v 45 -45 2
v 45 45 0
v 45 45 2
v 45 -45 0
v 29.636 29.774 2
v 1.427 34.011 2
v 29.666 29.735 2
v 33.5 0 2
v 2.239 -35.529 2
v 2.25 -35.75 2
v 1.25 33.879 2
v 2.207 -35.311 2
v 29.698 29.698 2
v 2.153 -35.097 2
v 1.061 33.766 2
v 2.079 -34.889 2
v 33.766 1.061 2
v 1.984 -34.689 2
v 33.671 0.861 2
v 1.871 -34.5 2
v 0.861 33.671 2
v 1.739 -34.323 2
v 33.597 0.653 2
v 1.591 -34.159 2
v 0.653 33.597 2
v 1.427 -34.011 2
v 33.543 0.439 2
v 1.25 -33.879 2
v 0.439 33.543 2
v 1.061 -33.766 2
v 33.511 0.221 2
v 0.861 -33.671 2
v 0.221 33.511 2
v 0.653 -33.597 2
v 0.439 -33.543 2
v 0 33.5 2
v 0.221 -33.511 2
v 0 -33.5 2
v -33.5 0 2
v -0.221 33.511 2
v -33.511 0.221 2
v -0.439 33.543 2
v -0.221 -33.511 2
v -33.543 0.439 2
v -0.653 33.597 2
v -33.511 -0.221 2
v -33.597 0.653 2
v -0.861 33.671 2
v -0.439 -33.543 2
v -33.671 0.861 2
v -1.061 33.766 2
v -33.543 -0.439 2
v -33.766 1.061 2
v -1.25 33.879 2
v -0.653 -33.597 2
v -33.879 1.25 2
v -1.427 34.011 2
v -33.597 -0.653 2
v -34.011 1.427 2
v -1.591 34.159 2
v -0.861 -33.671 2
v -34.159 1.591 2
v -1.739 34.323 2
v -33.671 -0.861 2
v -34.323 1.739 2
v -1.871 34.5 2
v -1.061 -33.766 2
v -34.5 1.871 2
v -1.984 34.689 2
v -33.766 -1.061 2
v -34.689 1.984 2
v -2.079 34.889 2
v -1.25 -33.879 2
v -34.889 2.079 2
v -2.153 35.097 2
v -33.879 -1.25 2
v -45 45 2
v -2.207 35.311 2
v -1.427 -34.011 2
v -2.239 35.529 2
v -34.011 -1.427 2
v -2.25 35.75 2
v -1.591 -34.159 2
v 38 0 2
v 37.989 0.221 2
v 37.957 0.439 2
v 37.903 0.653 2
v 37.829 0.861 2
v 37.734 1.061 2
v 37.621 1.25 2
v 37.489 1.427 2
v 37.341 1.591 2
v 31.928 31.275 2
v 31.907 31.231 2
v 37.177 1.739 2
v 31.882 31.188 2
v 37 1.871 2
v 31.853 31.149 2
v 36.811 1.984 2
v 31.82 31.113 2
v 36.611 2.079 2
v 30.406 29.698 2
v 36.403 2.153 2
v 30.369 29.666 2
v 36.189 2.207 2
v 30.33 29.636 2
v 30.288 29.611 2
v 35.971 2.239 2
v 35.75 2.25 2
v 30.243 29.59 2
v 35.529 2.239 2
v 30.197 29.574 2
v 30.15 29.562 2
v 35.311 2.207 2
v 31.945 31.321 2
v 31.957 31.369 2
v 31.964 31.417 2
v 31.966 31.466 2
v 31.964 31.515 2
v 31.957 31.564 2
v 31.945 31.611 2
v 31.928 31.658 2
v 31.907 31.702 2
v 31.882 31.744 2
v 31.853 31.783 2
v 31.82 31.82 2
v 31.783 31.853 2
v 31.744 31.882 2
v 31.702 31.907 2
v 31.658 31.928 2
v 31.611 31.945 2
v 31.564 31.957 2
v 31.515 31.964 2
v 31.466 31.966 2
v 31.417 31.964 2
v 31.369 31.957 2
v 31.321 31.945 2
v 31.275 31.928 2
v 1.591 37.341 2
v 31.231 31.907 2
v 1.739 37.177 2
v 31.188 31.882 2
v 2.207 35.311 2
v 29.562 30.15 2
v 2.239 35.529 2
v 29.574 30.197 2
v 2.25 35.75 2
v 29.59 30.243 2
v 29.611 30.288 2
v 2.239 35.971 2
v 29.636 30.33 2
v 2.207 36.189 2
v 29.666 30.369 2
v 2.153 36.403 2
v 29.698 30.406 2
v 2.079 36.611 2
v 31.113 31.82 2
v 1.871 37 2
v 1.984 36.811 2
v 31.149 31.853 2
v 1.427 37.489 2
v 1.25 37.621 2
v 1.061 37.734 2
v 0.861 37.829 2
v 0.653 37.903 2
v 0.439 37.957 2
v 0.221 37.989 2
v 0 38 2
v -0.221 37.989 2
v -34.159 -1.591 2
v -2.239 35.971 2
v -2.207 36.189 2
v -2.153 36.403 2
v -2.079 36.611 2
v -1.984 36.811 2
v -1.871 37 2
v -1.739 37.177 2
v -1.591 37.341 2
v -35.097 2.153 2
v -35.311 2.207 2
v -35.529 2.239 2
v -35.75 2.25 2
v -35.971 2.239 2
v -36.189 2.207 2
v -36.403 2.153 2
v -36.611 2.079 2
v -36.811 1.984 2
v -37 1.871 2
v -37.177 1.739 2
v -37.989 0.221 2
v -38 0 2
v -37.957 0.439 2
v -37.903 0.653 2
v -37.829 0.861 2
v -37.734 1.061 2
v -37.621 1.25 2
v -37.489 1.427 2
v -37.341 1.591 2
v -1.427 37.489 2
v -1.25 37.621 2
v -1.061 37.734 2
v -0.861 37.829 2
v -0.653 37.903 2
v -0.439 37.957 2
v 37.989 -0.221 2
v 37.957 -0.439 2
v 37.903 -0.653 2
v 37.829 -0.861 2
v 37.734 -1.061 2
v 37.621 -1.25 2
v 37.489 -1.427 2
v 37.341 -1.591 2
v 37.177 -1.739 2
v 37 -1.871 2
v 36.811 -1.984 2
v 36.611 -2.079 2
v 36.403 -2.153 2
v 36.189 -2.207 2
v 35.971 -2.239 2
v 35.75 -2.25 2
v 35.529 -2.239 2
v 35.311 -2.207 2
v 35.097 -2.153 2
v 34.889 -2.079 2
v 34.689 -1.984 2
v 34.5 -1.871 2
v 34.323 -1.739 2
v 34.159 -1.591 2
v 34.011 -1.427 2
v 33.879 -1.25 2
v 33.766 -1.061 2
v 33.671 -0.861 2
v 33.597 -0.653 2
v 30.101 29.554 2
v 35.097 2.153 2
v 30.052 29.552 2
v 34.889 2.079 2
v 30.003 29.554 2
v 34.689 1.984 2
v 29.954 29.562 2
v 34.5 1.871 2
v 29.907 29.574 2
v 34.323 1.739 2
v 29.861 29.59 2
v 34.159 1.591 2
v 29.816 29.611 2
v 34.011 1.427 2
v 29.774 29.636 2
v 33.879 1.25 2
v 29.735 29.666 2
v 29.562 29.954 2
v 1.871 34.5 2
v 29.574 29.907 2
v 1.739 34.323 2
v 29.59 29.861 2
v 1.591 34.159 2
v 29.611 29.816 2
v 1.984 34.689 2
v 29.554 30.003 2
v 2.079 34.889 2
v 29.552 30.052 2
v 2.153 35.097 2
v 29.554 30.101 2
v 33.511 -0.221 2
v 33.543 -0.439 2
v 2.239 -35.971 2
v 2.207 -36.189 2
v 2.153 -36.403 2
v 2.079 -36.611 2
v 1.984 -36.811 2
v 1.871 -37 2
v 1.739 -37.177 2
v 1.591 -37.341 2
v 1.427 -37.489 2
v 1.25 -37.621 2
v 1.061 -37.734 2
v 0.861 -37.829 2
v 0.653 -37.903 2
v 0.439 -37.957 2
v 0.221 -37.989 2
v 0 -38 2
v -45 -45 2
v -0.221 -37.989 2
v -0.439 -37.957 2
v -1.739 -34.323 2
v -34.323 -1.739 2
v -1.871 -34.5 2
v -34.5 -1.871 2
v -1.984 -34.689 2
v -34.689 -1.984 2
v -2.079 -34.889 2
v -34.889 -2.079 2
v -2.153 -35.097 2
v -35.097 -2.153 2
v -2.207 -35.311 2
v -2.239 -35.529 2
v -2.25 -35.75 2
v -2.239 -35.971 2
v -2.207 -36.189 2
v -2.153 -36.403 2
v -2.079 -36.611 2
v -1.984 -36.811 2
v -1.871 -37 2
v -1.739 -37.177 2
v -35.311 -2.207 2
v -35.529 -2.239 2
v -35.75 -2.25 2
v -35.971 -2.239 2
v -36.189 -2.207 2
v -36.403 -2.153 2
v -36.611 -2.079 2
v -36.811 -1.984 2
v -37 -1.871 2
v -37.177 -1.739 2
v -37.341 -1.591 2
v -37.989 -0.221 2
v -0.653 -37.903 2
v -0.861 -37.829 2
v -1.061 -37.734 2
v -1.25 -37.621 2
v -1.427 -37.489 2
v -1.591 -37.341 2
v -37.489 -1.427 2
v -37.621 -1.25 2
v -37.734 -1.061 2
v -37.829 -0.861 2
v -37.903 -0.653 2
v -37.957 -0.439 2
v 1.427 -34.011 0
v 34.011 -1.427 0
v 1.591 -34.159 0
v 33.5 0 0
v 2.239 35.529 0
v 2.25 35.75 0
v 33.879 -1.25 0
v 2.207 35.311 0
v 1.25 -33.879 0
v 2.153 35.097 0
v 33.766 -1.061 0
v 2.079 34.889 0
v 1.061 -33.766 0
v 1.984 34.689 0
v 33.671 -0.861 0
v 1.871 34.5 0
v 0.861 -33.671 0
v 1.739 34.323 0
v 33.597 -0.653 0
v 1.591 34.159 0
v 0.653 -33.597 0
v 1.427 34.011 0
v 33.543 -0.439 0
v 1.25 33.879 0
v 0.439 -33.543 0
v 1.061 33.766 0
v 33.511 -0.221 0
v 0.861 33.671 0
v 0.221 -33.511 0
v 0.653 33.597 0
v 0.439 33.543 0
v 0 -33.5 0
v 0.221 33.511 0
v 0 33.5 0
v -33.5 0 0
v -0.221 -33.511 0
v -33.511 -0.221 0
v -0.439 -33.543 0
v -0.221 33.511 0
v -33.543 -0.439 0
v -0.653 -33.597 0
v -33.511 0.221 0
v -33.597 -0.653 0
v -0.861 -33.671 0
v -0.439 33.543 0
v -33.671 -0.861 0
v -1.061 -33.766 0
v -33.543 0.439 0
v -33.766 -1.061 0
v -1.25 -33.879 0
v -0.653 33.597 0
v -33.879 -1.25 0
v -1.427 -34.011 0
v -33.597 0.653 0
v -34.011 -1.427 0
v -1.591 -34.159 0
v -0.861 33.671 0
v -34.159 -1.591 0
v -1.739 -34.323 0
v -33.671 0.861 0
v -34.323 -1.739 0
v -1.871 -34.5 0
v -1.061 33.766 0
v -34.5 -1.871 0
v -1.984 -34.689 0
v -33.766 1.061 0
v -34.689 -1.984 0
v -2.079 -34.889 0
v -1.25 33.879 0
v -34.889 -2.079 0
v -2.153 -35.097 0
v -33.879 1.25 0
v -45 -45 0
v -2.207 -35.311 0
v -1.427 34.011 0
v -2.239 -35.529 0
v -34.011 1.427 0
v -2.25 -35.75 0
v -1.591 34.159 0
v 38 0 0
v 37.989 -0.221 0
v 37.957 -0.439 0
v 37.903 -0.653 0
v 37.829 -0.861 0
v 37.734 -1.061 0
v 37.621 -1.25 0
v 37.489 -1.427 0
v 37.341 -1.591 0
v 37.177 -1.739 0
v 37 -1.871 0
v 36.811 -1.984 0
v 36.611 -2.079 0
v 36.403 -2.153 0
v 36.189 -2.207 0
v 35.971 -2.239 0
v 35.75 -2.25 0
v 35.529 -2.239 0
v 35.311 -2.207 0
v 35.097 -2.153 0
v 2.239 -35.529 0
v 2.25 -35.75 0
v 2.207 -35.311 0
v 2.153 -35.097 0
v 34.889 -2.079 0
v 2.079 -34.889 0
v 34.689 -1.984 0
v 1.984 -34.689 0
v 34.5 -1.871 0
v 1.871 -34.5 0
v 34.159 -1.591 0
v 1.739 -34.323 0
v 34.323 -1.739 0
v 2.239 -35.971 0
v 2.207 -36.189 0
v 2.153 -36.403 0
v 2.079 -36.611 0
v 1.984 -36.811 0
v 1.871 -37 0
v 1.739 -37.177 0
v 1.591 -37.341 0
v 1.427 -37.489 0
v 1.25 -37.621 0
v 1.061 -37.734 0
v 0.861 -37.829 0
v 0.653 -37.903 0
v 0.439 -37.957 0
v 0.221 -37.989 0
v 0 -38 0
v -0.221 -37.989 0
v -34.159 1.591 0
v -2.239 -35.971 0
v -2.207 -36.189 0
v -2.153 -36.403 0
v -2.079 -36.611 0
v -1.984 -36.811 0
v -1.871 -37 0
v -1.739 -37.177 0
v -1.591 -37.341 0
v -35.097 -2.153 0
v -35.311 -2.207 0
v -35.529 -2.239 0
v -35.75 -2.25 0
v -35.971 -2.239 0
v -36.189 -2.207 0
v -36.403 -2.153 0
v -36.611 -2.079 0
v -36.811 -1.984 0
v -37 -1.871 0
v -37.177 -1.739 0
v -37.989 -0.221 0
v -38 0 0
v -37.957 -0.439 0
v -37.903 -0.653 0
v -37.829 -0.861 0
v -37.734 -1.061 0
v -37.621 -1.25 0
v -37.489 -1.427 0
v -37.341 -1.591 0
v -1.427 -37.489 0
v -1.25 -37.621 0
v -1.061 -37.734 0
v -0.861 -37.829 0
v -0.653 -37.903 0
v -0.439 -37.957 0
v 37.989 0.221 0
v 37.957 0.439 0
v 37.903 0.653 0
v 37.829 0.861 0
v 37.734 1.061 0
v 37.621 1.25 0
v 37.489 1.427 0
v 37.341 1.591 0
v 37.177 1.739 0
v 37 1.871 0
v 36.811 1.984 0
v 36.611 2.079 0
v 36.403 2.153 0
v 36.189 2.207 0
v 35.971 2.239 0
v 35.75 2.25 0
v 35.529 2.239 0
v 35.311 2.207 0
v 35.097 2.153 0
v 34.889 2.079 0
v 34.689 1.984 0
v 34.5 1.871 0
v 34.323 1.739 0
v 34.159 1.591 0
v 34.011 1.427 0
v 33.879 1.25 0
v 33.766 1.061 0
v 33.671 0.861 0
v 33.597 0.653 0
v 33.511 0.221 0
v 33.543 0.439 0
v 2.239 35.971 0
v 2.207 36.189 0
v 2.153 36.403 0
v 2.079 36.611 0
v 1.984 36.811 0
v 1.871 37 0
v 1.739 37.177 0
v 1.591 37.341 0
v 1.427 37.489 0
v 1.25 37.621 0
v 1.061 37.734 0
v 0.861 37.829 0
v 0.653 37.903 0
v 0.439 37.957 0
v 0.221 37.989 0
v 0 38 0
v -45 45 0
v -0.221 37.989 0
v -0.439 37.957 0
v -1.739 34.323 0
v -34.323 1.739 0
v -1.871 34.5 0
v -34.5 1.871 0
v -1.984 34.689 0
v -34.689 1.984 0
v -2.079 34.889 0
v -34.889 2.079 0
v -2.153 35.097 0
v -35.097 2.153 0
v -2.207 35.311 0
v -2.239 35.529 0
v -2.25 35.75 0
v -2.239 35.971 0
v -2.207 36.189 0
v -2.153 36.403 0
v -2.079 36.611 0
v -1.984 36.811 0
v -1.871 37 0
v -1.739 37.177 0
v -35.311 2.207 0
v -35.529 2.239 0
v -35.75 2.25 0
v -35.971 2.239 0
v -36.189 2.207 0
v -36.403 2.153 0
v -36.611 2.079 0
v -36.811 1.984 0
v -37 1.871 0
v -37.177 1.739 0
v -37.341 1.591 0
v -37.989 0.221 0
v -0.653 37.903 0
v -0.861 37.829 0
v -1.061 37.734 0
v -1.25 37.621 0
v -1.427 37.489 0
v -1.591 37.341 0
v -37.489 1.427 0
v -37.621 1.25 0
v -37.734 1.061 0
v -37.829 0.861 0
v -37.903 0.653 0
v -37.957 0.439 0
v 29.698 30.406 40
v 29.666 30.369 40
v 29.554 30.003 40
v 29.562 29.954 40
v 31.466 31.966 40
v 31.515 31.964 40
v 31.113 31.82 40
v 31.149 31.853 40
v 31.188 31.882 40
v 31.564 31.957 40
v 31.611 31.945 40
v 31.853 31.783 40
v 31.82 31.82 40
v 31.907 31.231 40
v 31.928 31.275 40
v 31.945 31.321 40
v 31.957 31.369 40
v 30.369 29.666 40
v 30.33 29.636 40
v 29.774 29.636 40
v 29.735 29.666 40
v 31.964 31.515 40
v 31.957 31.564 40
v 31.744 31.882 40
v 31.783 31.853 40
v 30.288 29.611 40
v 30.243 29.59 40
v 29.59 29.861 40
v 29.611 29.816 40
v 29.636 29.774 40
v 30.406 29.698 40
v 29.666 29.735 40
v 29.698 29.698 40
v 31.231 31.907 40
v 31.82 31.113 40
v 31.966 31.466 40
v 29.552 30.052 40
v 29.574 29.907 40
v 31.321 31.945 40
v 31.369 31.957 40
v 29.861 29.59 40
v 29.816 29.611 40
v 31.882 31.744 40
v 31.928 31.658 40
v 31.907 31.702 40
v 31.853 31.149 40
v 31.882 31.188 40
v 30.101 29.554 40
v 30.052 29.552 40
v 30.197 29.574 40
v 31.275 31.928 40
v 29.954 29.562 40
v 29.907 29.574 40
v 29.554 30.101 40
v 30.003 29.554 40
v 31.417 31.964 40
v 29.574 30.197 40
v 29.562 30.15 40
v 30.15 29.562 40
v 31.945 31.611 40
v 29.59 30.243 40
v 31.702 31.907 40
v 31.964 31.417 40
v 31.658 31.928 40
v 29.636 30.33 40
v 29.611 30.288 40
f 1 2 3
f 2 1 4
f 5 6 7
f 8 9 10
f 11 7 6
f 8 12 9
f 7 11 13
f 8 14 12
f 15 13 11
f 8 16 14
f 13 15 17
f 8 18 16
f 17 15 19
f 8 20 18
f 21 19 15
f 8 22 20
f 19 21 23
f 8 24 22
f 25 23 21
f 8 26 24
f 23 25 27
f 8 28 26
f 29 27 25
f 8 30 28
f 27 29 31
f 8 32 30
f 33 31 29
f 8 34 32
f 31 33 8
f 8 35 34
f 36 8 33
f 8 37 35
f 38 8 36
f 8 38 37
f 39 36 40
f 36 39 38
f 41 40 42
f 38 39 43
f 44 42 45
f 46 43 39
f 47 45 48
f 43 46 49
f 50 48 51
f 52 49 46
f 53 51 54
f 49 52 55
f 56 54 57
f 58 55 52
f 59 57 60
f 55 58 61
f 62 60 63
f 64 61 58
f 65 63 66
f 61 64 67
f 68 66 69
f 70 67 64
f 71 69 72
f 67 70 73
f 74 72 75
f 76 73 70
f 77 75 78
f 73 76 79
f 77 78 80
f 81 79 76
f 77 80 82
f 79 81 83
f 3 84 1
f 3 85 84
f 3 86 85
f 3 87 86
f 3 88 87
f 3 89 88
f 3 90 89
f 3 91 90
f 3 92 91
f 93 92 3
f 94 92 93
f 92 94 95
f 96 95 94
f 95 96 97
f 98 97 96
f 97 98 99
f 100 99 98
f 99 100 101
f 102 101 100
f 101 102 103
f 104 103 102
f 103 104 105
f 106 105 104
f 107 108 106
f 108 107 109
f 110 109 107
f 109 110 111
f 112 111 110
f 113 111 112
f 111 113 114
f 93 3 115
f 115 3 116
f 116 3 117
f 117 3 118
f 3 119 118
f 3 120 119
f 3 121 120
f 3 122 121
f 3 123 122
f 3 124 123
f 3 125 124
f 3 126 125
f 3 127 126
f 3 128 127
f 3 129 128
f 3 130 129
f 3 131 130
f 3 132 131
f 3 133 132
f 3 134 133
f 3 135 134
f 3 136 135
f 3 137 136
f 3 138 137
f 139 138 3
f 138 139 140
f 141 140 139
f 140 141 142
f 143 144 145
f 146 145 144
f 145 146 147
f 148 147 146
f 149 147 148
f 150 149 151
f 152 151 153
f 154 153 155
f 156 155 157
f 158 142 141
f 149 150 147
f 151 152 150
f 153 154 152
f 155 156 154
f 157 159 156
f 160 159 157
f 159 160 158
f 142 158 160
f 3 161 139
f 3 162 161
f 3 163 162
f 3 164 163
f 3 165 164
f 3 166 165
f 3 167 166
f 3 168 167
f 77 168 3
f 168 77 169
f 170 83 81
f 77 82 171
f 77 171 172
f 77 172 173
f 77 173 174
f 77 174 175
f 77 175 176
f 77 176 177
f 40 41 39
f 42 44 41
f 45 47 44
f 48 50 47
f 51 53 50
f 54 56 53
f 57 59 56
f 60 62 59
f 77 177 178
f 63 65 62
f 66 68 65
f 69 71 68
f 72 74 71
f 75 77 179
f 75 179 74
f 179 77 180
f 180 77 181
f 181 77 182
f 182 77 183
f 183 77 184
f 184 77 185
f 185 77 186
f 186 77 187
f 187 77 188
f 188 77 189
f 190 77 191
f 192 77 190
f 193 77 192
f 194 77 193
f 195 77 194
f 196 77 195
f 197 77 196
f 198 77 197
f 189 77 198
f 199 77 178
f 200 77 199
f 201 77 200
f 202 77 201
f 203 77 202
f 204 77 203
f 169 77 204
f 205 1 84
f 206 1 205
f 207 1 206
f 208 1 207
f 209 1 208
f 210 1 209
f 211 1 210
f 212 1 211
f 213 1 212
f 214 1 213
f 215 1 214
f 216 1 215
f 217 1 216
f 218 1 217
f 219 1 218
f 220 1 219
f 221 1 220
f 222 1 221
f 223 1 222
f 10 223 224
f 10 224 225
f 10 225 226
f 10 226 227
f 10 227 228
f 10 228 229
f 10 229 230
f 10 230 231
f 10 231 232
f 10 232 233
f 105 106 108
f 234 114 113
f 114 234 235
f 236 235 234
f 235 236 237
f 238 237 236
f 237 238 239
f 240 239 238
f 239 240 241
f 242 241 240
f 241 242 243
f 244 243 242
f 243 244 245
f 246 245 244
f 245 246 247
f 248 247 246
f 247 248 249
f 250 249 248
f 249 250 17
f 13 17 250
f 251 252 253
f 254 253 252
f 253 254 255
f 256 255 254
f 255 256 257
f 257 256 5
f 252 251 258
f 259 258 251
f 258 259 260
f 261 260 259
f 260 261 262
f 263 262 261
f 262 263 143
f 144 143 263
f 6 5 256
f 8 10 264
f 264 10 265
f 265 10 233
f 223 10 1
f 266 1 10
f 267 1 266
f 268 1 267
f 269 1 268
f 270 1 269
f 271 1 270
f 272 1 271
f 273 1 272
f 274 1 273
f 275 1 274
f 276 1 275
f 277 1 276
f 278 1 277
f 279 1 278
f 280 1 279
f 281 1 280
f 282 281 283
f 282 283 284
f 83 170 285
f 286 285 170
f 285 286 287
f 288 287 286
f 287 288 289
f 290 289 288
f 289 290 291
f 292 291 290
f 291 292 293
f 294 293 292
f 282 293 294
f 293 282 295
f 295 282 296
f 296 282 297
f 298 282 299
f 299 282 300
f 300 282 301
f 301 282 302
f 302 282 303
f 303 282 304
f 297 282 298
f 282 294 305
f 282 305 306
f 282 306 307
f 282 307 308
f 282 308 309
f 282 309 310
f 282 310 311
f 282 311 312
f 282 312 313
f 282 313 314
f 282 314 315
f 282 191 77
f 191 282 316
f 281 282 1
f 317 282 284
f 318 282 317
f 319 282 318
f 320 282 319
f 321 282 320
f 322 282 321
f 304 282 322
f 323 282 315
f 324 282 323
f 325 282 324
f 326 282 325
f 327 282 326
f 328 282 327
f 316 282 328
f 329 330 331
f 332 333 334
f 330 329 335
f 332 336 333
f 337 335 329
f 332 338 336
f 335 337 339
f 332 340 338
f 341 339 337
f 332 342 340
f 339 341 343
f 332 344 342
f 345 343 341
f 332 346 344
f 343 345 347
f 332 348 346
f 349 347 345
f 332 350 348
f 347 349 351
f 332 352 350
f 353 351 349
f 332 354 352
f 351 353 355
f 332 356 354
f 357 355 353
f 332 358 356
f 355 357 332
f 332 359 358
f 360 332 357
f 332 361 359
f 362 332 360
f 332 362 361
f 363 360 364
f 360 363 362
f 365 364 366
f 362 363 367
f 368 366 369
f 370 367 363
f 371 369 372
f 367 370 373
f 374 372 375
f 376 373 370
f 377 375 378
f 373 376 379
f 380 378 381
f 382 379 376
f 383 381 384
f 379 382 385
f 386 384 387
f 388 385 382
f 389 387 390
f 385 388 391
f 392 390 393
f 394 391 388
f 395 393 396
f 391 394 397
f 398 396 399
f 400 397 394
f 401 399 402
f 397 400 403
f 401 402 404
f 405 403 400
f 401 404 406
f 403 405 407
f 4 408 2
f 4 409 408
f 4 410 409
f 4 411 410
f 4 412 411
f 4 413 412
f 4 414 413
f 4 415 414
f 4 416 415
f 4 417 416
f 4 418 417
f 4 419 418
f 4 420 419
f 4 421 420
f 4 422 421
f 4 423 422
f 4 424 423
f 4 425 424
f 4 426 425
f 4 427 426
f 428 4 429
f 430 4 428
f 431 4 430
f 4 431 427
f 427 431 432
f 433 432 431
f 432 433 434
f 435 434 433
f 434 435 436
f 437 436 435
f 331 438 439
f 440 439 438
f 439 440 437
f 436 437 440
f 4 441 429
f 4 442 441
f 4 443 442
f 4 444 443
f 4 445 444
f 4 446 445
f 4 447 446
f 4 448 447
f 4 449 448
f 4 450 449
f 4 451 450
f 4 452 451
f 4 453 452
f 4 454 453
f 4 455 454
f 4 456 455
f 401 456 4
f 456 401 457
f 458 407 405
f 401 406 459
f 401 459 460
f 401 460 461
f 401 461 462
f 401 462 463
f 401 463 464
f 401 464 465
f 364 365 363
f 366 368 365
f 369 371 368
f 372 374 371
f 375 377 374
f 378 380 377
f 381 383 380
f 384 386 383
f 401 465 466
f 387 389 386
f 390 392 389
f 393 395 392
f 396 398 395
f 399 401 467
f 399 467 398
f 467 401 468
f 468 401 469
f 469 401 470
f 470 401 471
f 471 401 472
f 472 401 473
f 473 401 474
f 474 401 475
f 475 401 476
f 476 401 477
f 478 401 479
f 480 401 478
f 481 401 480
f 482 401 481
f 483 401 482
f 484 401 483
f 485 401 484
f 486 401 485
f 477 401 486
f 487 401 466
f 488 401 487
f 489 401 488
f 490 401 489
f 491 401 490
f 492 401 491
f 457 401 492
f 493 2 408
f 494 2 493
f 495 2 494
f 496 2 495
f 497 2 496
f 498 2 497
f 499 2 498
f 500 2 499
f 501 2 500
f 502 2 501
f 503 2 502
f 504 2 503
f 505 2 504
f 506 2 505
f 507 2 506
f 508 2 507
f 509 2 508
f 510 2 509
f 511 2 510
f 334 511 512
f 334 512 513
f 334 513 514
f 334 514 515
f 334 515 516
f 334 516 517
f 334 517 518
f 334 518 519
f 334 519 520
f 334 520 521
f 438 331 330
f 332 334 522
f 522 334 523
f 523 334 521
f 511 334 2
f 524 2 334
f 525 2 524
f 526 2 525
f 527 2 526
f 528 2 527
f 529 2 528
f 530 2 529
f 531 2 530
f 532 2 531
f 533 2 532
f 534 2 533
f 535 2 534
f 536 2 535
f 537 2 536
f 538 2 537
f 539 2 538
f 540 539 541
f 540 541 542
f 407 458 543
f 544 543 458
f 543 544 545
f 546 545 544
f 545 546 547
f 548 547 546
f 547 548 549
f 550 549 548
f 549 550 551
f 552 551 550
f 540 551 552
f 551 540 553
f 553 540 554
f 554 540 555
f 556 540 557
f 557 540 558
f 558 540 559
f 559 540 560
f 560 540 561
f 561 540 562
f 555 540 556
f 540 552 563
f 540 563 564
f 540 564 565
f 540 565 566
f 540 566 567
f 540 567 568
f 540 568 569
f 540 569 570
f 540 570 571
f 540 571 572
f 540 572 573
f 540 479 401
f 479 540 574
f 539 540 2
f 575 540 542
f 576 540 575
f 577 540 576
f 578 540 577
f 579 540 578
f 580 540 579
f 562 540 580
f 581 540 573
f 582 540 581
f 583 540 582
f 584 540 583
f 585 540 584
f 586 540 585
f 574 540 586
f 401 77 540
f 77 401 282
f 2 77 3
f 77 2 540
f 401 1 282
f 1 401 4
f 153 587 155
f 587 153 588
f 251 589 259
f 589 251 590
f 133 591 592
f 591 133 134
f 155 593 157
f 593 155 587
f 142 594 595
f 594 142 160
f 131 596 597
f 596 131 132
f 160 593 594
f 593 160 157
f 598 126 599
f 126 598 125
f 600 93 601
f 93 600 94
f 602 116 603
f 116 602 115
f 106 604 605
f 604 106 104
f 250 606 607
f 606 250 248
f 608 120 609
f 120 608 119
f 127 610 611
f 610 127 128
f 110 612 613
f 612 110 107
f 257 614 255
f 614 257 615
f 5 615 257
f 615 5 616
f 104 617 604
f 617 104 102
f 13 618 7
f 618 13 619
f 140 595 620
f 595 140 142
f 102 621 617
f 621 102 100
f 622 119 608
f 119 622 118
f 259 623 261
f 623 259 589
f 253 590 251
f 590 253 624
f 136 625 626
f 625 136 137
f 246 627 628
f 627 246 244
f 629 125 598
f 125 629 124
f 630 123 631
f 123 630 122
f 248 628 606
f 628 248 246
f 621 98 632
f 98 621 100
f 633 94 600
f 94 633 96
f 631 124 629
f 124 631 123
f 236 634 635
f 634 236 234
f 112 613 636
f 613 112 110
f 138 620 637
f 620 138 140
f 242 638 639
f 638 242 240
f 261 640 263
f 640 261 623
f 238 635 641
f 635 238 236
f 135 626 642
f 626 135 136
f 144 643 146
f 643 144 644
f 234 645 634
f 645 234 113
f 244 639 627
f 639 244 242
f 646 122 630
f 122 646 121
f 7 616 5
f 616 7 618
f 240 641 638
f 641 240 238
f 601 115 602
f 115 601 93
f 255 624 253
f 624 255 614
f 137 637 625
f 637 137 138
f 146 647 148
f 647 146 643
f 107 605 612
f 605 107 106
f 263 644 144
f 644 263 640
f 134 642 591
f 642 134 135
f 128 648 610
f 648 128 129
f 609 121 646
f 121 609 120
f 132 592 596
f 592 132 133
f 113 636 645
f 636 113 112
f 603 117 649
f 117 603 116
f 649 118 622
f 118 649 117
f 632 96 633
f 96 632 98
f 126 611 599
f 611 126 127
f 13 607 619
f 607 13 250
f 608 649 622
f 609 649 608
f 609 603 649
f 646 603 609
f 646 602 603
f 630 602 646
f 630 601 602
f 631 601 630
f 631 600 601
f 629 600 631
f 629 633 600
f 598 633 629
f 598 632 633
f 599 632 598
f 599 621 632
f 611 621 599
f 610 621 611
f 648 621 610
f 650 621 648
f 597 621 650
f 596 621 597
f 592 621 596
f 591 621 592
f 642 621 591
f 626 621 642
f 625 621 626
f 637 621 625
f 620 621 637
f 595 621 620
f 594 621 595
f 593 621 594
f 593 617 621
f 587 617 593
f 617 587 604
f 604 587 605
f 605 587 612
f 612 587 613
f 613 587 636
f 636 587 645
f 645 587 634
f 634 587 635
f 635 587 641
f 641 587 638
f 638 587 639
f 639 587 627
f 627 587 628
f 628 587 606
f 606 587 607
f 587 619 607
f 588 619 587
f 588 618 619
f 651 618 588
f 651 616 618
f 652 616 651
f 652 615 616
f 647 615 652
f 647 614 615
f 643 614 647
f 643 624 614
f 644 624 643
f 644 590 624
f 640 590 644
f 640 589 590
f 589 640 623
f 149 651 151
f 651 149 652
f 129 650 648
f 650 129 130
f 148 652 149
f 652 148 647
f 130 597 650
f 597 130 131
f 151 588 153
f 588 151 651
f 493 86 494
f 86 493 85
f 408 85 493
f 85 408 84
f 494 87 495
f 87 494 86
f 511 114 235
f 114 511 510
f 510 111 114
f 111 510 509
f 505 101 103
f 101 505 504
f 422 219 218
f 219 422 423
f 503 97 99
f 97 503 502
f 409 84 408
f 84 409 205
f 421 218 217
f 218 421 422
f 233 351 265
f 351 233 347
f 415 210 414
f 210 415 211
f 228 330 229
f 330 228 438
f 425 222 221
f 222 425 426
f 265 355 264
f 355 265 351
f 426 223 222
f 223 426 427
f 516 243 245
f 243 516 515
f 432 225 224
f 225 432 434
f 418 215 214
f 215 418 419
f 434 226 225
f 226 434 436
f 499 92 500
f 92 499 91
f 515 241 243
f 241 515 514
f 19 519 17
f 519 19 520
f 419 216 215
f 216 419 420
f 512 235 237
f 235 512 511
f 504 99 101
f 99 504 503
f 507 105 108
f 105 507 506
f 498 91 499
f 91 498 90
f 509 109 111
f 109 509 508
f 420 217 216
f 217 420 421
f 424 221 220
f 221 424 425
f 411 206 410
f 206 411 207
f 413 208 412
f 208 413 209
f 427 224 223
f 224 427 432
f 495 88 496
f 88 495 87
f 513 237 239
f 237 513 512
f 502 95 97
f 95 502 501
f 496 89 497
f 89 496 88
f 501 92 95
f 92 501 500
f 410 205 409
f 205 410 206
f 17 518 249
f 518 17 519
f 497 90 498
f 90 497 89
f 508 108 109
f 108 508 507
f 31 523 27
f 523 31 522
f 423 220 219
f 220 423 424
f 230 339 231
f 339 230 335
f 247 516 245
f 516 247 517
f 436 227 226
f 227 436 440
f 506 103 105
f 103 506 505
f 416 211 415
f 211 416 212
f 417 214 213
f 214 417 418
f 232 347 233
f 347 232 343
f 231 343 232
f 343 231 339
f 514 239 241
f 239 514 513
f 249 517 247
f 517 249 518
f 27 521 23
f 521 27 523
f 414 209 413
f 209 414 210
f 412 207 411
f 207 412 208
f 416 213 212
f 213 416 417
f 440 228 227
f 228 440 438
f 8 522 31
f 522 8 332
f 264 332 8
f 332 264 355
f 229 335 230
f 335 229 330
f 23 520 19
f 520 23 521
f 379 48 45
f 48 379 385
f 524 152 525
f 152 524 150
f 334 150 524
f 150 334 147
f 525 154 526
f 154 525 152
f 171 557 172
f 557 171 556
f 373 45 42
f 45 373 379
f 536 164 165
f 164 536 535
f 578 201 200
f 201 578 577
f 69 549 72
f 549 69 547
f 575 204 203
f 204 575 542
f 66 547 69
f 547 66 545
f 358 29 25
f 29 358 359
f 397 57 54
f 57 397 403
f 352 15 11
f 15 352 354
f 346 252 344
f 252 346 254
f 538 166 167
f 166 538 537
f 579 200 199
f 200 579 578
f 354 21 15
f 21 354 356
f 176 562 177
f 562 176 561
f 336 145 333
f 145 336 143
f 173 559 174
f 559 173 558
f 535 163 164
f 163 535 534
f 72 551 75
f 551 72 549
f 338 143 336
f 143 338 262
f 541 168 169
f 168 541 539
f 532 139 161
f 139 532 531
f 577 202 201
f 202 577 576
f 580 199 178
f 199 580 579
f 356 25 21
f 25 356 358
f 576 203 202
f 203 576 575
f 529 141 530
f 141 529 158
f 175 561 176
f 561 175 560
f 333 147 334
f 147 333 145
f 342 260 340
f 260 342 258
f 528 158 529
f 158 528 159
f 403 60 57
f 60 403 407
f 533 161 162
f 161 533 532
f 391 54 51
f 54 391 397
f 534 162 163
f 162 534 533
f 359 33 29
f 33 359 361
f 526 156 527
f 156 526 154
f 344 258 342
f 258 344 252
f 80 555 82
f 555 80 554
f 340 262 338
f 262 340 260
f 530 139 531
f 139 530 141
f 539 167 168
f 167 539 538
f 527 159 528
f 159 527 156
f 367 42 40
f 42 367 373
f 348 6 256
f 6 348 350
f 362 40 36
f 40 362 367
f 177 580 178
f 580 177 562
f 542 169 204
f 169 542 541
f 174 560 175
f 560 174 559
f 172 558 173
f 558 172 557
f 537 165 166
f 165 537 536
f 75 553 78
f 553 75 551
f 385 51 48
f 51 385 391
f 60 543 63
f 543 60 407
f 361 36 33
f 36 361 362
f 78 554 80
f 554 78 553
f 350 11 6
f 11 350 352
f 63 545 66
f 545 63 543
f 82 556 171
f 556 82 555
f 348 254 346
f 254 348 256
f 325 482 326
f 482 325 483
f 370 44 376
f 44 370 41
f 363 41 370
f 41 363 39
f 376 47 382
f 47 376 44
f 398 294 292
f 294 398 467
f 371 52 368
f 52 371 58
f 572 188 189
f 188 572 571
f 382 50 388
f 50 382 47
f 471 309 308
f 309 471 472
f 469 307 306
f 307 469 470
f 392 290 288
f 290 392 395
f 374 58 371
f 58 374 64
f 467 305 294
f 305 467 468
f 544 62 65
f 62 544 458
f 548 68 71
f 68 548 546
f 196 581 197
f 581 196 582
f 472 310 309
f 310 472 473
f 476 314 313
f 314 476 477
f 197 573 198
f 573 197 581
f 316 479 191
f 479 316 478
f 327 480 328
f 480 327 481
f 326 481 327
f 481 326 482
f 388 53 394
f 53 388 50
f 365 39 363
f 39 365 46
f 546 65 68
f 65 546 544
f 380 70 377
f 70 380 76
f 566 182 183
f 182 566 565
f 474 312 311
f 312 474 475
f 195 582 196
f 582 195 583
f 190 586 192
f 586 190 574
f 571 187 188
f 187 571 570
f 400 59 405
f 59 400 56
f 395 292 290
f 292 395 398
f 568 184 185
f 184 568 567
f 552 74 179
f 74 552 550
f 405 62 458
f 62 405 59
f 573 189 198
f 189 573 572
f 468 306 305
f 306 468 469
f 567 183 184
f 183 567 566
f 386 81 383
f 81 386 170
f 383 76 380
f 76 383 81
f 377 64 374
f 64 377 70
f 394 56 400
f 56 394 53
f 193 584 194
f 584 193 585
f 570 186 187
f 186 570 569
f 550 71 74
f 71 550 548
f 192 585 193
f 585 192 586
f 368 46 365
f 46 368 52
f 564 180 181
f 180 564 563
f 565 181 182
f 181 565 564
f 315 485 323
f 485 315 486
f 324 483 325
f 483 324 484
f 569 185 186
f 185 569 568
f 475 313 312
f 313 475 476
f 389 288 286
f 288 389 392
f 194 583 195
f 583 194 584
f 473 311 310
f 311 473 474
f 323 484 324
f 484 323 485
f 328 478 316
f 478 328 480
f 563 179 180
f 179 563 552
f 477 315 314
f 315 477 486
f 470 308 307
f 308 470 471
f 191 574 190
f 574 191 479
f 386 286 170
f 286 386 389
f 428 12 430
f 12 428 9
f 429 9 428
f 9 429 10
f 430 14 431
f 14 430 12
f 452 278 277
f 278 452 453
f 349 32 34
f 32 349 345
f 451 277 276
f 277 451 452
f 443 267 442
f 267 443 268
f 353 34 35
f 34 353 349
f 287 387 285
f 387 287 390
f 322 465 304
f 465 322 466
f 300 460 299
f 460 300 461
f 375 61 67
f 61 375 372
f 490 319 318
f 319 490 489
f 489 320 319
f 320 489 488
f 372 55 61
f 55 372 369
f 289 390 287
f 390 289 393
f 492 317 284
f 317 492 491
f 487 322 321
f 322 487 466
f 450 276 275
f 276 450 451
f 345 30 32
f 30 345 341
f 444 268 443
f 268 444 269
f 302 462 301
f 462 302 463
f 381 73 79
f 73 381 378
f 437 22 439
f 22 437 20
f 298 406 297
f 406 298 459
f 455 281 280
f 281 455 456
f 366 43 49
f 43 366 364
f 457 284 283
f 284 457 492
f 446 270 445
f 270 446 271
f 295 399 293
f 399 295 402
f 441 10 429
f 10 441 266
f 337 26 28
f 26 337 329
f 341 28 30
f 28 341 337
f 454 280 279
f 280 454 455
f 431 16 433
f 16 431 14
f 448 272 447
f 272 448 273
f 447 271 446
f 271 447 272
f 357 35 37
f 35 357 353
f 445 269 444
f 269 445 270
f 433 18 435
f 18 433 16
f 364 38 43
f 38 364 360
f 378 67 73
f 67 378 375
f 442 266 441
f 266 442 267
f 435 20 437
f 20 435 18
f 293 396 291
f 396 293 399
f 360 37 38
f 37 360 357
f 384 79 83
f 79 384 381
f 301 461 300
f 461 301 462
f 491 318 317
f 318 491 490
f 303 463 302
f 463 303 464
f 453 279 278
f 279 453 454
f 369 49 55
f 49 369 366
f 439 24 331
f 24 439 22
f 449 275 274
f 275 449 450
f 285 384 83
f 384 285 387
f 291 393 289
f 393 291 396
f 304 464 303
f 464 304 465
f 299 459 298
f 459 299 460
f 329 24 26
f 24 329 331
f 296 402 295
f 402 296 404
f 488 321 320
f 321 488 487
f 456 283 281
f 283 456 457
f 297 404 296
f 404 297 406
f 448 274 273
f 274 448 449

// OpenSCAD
// DIY magnetic stirrer housing for 80 mm PC case fan
// Print orientation: top plate down on bed (z = 0), open top at z = 40

// ---------- Parameters ----------
outer_size   = 90;    // outer size of top plate (X x Y), mm
plate_t      = 2;     // top plate thickness, mm
wall_t       = 2.5;   // wall thickness, mm
box_h        = 40;    // overall height, mm
hole_d       = 4.5;   // M4 screw hole diameter, mm
hole_pitch   = 71.5;  // square pattern centre-to-centre spacing, mm
notch_w      = 12;    // power cable notch width, mm
notch_depth  = 8;     // notch depth from open edge, mm
eps          = 0.5;   // cutter overshoot past faces, mm
$fn          = 64;    // curve resolution

// ---------- Derived ----------
inner_r = (outer_size - 2 * wall_t) / 2;   // inner radius (42.5 mm)

// ---------- Model ----------
difference() {
    union() {
        // Top plate (print bed side)
        translate([-outer_size / 2, -outer_size / 2, 0])
            cube([outer_size, outer_size, plate_t]);

        // Walls rising to open top
        hull() {
            for (r = [inner_r, outer_size / 2 - eps])
                translate([r * cos(45), r * sin(45), plate_t])
                    cylinder(r = eps, h = box_h - plate_t);
        }
    }

    // Screw holes through top plate
    for (i = [0 : 3]) {
        a = 90 * i;
        translate([hole_pitch / 2 * cos(a), hole_pitch / 2 * sin(a), -eps])
            cylinder(d = hole_d, h = plate_t + 2 * eps);
    }

    // Power cable notch in one wall (z = 32 to 40)
    translate([-inner_r, -inner_r, box_h - notch_depth])
        cube([notch_w, notch_w, notch_depth + eps]);
}
